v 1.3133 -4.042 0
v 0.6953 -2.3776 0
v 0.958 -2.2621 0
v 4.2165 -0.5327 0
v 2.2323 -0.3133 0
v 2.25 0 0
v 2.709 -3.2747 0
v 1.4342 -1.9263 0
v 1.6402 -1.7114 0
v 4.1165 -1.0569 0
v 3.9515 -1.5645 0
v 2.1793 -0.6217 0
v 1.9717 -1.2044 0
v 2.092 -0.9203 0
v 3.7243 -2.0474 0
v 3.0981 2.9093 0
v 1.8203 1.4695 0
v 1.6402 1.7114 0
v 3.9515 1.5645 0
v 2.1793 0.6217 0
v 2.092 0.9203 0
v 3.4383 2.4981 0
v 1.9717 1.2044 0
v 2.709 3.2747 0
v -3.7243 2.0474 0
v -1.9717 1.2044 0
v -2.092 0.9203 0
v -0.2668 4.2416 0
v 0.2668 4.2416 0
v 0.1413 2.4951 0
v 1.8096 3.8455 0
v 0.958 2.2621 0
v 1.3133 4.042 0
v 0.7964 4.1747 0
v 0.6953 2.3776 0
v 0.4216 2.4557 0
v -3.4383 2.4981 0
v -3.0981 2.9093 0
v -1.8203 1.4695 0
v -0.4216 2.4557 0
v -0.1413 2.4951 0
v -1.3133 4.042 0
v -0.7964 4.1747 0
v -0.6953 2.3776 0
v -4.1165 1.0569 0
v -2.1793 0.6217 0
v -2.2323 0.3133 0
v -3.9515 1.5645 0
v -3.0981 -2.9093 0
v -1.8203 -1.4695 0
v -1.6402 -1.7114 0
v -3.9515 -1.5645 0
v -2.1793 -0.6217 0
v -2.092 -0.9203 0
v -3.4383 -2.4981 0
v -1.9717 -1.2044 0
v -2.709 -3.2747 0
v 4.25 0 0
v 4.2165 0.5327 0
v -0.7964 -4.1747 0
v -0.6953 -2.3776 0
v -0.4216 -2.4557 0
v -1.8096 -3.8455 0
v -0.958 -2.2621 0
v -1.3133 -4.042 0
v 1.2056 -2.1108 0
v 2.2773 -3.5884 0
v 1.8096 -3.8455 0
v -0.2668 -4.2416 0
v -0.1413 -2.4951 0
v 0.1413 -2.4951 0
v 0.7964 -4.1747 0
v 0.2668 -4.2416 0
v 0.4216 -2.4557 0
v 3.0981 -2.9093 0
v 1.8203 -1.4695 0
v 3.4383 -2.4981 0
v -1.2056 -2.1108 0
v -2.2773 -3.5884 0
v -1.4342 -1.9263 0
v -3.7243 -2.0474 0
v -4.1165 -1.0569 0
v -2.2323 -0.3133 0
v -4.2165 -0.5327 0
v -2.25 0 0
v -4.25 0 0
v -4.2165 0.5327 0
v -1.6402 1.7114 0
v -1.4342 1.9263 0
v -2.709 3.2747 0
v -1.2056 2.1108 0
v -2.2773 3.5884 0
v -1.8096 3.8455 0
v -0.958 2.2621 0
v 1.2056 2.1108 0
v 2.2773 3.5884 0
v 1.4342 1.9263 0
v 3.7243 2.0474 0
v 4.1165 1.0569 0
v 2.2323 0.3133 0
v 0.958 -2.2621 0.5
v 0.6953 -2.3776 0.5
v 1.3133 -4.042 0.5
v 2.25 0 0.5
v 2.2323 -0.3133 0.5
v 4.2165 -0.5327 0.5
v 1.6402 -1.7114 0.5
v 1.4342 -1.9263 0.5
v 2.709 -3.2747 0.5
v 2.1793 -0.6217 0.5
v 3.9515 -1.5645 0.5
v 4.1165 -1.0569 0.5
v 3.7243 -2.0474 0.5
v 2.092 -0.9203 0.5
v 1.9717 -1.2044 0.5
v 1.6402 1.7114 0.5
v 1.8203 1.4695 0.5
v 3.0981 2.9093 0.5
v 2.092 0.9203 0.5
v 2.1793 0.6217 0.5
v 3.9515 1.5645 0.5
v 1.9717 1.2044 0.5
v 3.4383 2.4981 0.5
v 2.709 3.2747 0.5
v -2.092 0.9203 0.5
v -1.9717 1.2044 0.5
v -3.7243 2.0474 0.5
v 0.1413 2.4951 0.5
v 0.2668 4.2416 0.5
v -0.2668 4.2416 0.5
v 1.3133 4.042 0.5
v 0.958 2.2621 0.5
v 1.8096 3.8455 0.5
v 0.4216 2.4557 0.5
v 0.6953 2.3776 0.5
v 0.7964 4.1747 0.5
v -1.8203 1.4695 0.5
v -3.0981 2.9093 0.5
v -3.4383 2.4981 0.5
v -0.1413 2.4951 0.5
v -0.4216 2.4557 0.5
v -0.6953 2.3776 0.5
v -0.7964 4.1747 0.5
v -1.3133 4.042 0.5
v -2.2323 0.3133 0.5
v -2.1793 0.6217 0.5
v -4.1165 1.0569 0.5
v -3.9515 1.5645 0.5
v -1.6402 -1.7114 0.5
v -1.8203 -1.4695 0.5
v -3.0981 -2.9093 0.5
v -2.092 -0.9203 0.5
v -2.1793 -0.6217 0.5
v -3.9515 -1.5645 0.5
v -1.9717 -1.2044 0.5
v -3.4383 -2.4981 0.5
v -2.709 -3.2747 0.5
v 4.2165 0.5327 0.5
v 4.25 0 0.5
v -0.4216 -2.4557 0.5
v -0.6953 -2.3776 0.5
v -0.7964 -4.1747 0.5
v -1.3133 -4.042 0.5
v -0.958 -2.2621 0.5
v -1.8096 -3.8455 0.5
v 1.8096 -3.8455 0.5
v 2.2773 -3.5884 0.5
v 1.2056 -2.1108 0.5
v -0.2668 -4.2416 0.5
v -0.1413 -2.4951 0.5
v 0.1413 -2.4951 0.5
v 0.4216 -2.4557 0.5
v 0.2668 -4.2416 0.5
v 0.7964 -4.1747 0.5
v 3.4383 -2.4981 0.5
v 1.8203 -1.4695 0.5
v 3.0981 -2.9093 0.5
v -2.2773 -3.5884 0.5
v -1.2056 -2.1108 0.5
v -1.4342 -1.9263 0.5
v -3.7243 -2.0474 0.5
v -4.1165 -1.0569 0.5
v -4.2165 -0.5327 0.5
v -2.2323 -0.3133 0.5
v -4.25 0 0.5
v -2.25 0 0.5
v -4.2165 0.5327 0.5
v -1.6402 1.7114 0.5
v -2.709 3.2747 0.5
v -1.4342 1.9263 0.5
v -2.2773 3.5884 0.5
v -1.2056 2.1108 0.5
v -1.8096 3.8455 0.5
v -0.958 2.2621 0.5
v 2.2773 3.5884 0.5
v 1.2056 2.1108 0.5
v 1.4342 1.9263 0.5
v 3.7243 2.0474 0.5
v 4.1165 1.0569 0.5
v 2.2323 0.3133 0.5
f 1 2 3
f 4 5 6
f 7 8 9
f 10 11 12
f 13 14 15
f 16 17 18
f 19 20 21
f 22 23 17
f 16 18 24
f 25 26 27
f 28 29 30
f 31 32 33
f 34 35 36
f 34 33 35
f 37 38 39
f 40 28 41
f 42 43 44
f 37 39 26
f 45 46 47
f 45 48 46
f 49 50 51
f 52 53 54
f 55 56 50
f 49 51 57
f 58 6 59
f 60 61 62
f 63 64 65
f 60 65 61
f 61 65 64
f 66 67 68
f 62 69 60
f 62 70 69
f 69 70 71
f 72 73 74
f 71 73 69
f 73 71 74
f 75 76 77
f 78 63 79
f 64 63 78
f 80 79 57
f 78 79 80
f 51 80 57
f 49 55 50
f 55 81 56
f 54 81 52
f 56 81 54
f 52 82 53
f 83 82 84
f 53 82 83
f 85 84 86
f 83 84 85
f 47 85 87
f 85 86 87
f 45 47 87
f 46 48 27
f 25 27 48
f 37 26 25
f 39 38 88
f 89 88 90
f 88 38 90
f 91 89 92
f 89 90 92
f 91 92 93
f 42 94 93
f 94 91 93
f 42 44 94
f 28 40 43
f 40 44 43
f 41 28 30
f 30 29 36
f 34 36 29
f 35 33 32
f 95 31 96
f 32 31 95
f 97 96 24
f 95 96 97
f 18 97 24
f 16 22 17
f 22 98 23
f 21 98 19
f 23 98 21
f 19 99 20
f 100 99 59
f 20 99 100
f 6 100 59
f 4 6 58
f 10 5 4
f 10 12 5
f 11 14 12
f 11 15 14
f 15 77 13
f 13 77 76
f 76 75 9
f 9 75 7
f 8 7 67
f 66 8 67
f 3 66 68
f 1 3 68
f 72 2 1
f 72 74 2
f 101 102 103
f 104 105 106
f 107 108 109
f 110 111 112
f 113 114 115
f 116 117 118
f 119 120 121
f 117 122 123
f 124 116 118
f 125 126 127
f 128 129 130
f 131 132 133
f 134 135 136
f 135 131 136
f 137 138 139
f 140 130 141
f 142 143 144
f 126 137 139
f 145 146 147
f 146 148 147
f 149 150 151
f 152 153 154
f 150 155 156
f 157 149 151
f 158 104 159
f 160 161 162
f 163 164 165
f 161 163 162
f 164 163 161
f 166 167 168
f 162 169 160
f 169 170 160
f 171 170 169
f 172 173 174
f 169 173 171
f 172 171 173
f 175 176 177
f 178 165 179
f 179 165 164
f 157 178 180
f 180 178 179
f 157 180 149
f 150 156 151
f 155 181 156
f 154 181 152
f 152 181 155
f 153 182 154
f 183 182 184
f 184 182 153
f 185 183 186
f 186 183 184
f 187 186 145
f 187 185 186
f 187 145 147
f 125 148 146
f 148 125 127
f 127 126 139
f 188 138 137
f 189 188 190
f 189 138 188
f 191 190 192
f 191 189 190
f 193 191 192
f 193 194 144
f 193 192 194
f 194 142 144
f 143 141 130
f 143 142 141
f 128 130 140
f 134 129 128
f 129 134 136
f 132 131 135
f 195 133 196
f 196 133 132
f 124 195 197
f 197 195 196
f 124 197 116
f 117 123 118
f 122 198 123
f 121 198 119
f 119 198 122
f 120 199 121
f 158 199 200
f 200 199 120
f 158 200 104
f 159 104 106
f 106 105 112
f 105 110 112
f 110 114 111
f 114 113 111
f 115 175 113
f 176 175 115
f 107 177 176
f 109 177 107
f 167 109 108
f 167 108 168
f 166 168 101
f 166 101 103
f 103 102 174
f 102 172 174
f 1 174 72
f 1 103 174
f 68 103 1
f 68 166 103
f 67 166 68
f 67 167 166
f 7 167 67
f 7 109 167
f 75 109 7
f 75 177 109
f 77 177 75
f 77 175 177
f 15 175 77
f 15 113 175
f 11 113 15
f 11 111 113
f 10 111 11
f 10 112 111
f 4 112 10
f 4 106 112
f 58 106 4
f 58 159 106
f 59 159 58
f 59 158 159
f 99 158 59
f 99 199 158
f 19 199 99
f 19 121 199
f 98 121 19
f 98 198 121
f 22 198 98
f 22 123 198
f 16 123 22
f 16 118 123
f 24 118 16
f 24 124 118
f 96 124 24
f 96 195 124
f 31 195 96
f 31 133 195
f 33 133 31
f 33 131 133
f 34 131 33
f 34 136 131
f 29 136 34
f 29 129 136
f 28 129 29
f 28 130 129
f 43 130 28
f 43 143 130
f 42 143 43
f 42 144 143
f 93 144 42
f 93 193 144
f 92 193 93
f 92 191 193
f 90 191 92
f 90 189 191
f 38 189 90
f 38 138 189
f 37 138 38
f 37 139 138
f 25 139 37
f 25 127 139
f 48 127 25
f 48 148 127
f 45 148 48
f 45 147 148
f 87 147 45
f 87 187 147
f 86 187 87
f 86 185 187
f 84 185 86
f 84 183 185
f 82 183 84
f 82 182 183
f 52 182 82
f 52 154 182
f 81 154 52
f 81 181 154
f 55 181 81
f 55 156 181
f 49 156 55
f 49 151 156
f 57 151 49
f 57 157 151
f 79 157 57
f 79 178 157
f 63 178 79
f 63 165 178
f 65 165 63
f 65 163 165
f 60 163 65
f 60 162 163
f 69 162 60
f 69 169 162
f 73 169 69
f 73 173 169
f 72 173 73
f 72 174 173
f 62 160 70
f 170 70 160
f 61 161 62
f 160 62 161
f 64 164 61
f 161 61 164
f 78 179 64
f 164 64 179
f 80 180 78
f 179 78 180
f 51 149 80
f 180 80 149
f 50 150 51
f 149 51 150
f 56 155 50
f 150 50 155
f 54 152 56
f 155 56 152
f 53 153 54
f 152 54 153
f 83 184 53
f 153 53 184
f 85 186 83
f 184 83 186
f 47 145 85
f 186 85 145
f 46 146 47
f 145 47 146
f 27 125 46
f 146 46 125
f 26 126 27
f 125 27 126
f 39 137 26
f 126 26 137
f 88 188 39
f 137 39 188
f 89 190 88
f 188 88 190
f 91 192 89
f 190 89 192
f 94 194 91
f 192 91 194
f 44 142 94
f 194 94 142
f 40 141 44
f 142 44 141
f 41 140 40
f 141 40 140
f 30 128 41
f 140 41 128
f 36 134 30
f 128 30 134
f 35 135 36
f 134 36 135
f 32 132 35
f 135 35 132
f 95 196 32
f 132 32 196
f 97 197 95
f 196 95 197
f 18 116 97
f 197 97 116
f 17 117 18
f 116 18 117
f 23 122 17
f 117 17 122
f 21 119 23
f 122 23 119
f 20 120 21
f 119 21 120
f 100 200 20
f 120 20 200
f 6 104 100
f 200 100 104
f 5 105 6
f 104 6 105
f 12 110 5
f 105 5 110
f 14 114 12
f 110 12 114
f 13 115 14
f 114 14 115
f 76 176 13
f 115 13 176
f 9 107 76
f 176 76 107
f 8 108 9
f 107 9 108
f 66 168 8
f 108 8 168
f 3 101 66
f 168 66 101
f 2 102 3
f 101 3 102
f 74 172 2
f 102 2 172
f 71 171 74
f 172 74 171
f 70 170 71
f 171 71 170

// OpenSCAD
$fn = 50 + 0;

needle_size = 3.5; // [2.0:US 0 \ GB 14, 2.1:JP 0, 2.25:US 1 GB 13, 2.4:JP 1, 2.5:2.5 mm, 2.7:JP 2, 2.75:US 2 \ GB 12, 3.0:GB 11 \ JP 3, 3.25:US 3 \ GB 10, 3.3:JP 4, 3.5:US 4, 3.6:JP 5, 3.75:US 5 \ GB 9, 3.9:JP 6, 4.0:US 6 \ GB 8, 4.2:JP 7, 4.5:US 7 \ GB 7 \ JP 8, 4.8:JP 9, 5.0:US 8 \ GB 6, 5.1:JP 10, 5.4:JP 11, 5.5:US 9 \ GB 5, 5.7:JP 12, 6.0:US 10 \ GB 4 \ JP 13, 6.3:JP 14, 6.5:US 10 ½ \ GB 3, 6.6:JP 15, 7.0:GB 2 \ JP 7 mm, 7.5:GB 1, 8.0:US 11 \ GB 0 \ JP 8mm, 9.0:US 13 \ GB 00 \ JP 9mm, 10.0:US 15 \ GB  000 \ JP 10mm, 12.0:US 17, 16.0:US 19, 19.0:US 35, 25.0:US 50]
width = 2; // [2:10]
thickness = 0.5; // [0.5, 1.0, 1.5, 2.0, 2.5, 3.0]
clearance = 0.5 + 0;
radius = (needle_size / 2 + width + clearance) / 0.9;
slot_width = 1 + 0;

linear_extrude(height = thickness) {
	difference() {
        circle(r=needle_size / 2 + width + clearance );
		scale([0.9, 1, 1]) circle(r=(needle_size / 2 + clearance) / 0.9);
	}
}
